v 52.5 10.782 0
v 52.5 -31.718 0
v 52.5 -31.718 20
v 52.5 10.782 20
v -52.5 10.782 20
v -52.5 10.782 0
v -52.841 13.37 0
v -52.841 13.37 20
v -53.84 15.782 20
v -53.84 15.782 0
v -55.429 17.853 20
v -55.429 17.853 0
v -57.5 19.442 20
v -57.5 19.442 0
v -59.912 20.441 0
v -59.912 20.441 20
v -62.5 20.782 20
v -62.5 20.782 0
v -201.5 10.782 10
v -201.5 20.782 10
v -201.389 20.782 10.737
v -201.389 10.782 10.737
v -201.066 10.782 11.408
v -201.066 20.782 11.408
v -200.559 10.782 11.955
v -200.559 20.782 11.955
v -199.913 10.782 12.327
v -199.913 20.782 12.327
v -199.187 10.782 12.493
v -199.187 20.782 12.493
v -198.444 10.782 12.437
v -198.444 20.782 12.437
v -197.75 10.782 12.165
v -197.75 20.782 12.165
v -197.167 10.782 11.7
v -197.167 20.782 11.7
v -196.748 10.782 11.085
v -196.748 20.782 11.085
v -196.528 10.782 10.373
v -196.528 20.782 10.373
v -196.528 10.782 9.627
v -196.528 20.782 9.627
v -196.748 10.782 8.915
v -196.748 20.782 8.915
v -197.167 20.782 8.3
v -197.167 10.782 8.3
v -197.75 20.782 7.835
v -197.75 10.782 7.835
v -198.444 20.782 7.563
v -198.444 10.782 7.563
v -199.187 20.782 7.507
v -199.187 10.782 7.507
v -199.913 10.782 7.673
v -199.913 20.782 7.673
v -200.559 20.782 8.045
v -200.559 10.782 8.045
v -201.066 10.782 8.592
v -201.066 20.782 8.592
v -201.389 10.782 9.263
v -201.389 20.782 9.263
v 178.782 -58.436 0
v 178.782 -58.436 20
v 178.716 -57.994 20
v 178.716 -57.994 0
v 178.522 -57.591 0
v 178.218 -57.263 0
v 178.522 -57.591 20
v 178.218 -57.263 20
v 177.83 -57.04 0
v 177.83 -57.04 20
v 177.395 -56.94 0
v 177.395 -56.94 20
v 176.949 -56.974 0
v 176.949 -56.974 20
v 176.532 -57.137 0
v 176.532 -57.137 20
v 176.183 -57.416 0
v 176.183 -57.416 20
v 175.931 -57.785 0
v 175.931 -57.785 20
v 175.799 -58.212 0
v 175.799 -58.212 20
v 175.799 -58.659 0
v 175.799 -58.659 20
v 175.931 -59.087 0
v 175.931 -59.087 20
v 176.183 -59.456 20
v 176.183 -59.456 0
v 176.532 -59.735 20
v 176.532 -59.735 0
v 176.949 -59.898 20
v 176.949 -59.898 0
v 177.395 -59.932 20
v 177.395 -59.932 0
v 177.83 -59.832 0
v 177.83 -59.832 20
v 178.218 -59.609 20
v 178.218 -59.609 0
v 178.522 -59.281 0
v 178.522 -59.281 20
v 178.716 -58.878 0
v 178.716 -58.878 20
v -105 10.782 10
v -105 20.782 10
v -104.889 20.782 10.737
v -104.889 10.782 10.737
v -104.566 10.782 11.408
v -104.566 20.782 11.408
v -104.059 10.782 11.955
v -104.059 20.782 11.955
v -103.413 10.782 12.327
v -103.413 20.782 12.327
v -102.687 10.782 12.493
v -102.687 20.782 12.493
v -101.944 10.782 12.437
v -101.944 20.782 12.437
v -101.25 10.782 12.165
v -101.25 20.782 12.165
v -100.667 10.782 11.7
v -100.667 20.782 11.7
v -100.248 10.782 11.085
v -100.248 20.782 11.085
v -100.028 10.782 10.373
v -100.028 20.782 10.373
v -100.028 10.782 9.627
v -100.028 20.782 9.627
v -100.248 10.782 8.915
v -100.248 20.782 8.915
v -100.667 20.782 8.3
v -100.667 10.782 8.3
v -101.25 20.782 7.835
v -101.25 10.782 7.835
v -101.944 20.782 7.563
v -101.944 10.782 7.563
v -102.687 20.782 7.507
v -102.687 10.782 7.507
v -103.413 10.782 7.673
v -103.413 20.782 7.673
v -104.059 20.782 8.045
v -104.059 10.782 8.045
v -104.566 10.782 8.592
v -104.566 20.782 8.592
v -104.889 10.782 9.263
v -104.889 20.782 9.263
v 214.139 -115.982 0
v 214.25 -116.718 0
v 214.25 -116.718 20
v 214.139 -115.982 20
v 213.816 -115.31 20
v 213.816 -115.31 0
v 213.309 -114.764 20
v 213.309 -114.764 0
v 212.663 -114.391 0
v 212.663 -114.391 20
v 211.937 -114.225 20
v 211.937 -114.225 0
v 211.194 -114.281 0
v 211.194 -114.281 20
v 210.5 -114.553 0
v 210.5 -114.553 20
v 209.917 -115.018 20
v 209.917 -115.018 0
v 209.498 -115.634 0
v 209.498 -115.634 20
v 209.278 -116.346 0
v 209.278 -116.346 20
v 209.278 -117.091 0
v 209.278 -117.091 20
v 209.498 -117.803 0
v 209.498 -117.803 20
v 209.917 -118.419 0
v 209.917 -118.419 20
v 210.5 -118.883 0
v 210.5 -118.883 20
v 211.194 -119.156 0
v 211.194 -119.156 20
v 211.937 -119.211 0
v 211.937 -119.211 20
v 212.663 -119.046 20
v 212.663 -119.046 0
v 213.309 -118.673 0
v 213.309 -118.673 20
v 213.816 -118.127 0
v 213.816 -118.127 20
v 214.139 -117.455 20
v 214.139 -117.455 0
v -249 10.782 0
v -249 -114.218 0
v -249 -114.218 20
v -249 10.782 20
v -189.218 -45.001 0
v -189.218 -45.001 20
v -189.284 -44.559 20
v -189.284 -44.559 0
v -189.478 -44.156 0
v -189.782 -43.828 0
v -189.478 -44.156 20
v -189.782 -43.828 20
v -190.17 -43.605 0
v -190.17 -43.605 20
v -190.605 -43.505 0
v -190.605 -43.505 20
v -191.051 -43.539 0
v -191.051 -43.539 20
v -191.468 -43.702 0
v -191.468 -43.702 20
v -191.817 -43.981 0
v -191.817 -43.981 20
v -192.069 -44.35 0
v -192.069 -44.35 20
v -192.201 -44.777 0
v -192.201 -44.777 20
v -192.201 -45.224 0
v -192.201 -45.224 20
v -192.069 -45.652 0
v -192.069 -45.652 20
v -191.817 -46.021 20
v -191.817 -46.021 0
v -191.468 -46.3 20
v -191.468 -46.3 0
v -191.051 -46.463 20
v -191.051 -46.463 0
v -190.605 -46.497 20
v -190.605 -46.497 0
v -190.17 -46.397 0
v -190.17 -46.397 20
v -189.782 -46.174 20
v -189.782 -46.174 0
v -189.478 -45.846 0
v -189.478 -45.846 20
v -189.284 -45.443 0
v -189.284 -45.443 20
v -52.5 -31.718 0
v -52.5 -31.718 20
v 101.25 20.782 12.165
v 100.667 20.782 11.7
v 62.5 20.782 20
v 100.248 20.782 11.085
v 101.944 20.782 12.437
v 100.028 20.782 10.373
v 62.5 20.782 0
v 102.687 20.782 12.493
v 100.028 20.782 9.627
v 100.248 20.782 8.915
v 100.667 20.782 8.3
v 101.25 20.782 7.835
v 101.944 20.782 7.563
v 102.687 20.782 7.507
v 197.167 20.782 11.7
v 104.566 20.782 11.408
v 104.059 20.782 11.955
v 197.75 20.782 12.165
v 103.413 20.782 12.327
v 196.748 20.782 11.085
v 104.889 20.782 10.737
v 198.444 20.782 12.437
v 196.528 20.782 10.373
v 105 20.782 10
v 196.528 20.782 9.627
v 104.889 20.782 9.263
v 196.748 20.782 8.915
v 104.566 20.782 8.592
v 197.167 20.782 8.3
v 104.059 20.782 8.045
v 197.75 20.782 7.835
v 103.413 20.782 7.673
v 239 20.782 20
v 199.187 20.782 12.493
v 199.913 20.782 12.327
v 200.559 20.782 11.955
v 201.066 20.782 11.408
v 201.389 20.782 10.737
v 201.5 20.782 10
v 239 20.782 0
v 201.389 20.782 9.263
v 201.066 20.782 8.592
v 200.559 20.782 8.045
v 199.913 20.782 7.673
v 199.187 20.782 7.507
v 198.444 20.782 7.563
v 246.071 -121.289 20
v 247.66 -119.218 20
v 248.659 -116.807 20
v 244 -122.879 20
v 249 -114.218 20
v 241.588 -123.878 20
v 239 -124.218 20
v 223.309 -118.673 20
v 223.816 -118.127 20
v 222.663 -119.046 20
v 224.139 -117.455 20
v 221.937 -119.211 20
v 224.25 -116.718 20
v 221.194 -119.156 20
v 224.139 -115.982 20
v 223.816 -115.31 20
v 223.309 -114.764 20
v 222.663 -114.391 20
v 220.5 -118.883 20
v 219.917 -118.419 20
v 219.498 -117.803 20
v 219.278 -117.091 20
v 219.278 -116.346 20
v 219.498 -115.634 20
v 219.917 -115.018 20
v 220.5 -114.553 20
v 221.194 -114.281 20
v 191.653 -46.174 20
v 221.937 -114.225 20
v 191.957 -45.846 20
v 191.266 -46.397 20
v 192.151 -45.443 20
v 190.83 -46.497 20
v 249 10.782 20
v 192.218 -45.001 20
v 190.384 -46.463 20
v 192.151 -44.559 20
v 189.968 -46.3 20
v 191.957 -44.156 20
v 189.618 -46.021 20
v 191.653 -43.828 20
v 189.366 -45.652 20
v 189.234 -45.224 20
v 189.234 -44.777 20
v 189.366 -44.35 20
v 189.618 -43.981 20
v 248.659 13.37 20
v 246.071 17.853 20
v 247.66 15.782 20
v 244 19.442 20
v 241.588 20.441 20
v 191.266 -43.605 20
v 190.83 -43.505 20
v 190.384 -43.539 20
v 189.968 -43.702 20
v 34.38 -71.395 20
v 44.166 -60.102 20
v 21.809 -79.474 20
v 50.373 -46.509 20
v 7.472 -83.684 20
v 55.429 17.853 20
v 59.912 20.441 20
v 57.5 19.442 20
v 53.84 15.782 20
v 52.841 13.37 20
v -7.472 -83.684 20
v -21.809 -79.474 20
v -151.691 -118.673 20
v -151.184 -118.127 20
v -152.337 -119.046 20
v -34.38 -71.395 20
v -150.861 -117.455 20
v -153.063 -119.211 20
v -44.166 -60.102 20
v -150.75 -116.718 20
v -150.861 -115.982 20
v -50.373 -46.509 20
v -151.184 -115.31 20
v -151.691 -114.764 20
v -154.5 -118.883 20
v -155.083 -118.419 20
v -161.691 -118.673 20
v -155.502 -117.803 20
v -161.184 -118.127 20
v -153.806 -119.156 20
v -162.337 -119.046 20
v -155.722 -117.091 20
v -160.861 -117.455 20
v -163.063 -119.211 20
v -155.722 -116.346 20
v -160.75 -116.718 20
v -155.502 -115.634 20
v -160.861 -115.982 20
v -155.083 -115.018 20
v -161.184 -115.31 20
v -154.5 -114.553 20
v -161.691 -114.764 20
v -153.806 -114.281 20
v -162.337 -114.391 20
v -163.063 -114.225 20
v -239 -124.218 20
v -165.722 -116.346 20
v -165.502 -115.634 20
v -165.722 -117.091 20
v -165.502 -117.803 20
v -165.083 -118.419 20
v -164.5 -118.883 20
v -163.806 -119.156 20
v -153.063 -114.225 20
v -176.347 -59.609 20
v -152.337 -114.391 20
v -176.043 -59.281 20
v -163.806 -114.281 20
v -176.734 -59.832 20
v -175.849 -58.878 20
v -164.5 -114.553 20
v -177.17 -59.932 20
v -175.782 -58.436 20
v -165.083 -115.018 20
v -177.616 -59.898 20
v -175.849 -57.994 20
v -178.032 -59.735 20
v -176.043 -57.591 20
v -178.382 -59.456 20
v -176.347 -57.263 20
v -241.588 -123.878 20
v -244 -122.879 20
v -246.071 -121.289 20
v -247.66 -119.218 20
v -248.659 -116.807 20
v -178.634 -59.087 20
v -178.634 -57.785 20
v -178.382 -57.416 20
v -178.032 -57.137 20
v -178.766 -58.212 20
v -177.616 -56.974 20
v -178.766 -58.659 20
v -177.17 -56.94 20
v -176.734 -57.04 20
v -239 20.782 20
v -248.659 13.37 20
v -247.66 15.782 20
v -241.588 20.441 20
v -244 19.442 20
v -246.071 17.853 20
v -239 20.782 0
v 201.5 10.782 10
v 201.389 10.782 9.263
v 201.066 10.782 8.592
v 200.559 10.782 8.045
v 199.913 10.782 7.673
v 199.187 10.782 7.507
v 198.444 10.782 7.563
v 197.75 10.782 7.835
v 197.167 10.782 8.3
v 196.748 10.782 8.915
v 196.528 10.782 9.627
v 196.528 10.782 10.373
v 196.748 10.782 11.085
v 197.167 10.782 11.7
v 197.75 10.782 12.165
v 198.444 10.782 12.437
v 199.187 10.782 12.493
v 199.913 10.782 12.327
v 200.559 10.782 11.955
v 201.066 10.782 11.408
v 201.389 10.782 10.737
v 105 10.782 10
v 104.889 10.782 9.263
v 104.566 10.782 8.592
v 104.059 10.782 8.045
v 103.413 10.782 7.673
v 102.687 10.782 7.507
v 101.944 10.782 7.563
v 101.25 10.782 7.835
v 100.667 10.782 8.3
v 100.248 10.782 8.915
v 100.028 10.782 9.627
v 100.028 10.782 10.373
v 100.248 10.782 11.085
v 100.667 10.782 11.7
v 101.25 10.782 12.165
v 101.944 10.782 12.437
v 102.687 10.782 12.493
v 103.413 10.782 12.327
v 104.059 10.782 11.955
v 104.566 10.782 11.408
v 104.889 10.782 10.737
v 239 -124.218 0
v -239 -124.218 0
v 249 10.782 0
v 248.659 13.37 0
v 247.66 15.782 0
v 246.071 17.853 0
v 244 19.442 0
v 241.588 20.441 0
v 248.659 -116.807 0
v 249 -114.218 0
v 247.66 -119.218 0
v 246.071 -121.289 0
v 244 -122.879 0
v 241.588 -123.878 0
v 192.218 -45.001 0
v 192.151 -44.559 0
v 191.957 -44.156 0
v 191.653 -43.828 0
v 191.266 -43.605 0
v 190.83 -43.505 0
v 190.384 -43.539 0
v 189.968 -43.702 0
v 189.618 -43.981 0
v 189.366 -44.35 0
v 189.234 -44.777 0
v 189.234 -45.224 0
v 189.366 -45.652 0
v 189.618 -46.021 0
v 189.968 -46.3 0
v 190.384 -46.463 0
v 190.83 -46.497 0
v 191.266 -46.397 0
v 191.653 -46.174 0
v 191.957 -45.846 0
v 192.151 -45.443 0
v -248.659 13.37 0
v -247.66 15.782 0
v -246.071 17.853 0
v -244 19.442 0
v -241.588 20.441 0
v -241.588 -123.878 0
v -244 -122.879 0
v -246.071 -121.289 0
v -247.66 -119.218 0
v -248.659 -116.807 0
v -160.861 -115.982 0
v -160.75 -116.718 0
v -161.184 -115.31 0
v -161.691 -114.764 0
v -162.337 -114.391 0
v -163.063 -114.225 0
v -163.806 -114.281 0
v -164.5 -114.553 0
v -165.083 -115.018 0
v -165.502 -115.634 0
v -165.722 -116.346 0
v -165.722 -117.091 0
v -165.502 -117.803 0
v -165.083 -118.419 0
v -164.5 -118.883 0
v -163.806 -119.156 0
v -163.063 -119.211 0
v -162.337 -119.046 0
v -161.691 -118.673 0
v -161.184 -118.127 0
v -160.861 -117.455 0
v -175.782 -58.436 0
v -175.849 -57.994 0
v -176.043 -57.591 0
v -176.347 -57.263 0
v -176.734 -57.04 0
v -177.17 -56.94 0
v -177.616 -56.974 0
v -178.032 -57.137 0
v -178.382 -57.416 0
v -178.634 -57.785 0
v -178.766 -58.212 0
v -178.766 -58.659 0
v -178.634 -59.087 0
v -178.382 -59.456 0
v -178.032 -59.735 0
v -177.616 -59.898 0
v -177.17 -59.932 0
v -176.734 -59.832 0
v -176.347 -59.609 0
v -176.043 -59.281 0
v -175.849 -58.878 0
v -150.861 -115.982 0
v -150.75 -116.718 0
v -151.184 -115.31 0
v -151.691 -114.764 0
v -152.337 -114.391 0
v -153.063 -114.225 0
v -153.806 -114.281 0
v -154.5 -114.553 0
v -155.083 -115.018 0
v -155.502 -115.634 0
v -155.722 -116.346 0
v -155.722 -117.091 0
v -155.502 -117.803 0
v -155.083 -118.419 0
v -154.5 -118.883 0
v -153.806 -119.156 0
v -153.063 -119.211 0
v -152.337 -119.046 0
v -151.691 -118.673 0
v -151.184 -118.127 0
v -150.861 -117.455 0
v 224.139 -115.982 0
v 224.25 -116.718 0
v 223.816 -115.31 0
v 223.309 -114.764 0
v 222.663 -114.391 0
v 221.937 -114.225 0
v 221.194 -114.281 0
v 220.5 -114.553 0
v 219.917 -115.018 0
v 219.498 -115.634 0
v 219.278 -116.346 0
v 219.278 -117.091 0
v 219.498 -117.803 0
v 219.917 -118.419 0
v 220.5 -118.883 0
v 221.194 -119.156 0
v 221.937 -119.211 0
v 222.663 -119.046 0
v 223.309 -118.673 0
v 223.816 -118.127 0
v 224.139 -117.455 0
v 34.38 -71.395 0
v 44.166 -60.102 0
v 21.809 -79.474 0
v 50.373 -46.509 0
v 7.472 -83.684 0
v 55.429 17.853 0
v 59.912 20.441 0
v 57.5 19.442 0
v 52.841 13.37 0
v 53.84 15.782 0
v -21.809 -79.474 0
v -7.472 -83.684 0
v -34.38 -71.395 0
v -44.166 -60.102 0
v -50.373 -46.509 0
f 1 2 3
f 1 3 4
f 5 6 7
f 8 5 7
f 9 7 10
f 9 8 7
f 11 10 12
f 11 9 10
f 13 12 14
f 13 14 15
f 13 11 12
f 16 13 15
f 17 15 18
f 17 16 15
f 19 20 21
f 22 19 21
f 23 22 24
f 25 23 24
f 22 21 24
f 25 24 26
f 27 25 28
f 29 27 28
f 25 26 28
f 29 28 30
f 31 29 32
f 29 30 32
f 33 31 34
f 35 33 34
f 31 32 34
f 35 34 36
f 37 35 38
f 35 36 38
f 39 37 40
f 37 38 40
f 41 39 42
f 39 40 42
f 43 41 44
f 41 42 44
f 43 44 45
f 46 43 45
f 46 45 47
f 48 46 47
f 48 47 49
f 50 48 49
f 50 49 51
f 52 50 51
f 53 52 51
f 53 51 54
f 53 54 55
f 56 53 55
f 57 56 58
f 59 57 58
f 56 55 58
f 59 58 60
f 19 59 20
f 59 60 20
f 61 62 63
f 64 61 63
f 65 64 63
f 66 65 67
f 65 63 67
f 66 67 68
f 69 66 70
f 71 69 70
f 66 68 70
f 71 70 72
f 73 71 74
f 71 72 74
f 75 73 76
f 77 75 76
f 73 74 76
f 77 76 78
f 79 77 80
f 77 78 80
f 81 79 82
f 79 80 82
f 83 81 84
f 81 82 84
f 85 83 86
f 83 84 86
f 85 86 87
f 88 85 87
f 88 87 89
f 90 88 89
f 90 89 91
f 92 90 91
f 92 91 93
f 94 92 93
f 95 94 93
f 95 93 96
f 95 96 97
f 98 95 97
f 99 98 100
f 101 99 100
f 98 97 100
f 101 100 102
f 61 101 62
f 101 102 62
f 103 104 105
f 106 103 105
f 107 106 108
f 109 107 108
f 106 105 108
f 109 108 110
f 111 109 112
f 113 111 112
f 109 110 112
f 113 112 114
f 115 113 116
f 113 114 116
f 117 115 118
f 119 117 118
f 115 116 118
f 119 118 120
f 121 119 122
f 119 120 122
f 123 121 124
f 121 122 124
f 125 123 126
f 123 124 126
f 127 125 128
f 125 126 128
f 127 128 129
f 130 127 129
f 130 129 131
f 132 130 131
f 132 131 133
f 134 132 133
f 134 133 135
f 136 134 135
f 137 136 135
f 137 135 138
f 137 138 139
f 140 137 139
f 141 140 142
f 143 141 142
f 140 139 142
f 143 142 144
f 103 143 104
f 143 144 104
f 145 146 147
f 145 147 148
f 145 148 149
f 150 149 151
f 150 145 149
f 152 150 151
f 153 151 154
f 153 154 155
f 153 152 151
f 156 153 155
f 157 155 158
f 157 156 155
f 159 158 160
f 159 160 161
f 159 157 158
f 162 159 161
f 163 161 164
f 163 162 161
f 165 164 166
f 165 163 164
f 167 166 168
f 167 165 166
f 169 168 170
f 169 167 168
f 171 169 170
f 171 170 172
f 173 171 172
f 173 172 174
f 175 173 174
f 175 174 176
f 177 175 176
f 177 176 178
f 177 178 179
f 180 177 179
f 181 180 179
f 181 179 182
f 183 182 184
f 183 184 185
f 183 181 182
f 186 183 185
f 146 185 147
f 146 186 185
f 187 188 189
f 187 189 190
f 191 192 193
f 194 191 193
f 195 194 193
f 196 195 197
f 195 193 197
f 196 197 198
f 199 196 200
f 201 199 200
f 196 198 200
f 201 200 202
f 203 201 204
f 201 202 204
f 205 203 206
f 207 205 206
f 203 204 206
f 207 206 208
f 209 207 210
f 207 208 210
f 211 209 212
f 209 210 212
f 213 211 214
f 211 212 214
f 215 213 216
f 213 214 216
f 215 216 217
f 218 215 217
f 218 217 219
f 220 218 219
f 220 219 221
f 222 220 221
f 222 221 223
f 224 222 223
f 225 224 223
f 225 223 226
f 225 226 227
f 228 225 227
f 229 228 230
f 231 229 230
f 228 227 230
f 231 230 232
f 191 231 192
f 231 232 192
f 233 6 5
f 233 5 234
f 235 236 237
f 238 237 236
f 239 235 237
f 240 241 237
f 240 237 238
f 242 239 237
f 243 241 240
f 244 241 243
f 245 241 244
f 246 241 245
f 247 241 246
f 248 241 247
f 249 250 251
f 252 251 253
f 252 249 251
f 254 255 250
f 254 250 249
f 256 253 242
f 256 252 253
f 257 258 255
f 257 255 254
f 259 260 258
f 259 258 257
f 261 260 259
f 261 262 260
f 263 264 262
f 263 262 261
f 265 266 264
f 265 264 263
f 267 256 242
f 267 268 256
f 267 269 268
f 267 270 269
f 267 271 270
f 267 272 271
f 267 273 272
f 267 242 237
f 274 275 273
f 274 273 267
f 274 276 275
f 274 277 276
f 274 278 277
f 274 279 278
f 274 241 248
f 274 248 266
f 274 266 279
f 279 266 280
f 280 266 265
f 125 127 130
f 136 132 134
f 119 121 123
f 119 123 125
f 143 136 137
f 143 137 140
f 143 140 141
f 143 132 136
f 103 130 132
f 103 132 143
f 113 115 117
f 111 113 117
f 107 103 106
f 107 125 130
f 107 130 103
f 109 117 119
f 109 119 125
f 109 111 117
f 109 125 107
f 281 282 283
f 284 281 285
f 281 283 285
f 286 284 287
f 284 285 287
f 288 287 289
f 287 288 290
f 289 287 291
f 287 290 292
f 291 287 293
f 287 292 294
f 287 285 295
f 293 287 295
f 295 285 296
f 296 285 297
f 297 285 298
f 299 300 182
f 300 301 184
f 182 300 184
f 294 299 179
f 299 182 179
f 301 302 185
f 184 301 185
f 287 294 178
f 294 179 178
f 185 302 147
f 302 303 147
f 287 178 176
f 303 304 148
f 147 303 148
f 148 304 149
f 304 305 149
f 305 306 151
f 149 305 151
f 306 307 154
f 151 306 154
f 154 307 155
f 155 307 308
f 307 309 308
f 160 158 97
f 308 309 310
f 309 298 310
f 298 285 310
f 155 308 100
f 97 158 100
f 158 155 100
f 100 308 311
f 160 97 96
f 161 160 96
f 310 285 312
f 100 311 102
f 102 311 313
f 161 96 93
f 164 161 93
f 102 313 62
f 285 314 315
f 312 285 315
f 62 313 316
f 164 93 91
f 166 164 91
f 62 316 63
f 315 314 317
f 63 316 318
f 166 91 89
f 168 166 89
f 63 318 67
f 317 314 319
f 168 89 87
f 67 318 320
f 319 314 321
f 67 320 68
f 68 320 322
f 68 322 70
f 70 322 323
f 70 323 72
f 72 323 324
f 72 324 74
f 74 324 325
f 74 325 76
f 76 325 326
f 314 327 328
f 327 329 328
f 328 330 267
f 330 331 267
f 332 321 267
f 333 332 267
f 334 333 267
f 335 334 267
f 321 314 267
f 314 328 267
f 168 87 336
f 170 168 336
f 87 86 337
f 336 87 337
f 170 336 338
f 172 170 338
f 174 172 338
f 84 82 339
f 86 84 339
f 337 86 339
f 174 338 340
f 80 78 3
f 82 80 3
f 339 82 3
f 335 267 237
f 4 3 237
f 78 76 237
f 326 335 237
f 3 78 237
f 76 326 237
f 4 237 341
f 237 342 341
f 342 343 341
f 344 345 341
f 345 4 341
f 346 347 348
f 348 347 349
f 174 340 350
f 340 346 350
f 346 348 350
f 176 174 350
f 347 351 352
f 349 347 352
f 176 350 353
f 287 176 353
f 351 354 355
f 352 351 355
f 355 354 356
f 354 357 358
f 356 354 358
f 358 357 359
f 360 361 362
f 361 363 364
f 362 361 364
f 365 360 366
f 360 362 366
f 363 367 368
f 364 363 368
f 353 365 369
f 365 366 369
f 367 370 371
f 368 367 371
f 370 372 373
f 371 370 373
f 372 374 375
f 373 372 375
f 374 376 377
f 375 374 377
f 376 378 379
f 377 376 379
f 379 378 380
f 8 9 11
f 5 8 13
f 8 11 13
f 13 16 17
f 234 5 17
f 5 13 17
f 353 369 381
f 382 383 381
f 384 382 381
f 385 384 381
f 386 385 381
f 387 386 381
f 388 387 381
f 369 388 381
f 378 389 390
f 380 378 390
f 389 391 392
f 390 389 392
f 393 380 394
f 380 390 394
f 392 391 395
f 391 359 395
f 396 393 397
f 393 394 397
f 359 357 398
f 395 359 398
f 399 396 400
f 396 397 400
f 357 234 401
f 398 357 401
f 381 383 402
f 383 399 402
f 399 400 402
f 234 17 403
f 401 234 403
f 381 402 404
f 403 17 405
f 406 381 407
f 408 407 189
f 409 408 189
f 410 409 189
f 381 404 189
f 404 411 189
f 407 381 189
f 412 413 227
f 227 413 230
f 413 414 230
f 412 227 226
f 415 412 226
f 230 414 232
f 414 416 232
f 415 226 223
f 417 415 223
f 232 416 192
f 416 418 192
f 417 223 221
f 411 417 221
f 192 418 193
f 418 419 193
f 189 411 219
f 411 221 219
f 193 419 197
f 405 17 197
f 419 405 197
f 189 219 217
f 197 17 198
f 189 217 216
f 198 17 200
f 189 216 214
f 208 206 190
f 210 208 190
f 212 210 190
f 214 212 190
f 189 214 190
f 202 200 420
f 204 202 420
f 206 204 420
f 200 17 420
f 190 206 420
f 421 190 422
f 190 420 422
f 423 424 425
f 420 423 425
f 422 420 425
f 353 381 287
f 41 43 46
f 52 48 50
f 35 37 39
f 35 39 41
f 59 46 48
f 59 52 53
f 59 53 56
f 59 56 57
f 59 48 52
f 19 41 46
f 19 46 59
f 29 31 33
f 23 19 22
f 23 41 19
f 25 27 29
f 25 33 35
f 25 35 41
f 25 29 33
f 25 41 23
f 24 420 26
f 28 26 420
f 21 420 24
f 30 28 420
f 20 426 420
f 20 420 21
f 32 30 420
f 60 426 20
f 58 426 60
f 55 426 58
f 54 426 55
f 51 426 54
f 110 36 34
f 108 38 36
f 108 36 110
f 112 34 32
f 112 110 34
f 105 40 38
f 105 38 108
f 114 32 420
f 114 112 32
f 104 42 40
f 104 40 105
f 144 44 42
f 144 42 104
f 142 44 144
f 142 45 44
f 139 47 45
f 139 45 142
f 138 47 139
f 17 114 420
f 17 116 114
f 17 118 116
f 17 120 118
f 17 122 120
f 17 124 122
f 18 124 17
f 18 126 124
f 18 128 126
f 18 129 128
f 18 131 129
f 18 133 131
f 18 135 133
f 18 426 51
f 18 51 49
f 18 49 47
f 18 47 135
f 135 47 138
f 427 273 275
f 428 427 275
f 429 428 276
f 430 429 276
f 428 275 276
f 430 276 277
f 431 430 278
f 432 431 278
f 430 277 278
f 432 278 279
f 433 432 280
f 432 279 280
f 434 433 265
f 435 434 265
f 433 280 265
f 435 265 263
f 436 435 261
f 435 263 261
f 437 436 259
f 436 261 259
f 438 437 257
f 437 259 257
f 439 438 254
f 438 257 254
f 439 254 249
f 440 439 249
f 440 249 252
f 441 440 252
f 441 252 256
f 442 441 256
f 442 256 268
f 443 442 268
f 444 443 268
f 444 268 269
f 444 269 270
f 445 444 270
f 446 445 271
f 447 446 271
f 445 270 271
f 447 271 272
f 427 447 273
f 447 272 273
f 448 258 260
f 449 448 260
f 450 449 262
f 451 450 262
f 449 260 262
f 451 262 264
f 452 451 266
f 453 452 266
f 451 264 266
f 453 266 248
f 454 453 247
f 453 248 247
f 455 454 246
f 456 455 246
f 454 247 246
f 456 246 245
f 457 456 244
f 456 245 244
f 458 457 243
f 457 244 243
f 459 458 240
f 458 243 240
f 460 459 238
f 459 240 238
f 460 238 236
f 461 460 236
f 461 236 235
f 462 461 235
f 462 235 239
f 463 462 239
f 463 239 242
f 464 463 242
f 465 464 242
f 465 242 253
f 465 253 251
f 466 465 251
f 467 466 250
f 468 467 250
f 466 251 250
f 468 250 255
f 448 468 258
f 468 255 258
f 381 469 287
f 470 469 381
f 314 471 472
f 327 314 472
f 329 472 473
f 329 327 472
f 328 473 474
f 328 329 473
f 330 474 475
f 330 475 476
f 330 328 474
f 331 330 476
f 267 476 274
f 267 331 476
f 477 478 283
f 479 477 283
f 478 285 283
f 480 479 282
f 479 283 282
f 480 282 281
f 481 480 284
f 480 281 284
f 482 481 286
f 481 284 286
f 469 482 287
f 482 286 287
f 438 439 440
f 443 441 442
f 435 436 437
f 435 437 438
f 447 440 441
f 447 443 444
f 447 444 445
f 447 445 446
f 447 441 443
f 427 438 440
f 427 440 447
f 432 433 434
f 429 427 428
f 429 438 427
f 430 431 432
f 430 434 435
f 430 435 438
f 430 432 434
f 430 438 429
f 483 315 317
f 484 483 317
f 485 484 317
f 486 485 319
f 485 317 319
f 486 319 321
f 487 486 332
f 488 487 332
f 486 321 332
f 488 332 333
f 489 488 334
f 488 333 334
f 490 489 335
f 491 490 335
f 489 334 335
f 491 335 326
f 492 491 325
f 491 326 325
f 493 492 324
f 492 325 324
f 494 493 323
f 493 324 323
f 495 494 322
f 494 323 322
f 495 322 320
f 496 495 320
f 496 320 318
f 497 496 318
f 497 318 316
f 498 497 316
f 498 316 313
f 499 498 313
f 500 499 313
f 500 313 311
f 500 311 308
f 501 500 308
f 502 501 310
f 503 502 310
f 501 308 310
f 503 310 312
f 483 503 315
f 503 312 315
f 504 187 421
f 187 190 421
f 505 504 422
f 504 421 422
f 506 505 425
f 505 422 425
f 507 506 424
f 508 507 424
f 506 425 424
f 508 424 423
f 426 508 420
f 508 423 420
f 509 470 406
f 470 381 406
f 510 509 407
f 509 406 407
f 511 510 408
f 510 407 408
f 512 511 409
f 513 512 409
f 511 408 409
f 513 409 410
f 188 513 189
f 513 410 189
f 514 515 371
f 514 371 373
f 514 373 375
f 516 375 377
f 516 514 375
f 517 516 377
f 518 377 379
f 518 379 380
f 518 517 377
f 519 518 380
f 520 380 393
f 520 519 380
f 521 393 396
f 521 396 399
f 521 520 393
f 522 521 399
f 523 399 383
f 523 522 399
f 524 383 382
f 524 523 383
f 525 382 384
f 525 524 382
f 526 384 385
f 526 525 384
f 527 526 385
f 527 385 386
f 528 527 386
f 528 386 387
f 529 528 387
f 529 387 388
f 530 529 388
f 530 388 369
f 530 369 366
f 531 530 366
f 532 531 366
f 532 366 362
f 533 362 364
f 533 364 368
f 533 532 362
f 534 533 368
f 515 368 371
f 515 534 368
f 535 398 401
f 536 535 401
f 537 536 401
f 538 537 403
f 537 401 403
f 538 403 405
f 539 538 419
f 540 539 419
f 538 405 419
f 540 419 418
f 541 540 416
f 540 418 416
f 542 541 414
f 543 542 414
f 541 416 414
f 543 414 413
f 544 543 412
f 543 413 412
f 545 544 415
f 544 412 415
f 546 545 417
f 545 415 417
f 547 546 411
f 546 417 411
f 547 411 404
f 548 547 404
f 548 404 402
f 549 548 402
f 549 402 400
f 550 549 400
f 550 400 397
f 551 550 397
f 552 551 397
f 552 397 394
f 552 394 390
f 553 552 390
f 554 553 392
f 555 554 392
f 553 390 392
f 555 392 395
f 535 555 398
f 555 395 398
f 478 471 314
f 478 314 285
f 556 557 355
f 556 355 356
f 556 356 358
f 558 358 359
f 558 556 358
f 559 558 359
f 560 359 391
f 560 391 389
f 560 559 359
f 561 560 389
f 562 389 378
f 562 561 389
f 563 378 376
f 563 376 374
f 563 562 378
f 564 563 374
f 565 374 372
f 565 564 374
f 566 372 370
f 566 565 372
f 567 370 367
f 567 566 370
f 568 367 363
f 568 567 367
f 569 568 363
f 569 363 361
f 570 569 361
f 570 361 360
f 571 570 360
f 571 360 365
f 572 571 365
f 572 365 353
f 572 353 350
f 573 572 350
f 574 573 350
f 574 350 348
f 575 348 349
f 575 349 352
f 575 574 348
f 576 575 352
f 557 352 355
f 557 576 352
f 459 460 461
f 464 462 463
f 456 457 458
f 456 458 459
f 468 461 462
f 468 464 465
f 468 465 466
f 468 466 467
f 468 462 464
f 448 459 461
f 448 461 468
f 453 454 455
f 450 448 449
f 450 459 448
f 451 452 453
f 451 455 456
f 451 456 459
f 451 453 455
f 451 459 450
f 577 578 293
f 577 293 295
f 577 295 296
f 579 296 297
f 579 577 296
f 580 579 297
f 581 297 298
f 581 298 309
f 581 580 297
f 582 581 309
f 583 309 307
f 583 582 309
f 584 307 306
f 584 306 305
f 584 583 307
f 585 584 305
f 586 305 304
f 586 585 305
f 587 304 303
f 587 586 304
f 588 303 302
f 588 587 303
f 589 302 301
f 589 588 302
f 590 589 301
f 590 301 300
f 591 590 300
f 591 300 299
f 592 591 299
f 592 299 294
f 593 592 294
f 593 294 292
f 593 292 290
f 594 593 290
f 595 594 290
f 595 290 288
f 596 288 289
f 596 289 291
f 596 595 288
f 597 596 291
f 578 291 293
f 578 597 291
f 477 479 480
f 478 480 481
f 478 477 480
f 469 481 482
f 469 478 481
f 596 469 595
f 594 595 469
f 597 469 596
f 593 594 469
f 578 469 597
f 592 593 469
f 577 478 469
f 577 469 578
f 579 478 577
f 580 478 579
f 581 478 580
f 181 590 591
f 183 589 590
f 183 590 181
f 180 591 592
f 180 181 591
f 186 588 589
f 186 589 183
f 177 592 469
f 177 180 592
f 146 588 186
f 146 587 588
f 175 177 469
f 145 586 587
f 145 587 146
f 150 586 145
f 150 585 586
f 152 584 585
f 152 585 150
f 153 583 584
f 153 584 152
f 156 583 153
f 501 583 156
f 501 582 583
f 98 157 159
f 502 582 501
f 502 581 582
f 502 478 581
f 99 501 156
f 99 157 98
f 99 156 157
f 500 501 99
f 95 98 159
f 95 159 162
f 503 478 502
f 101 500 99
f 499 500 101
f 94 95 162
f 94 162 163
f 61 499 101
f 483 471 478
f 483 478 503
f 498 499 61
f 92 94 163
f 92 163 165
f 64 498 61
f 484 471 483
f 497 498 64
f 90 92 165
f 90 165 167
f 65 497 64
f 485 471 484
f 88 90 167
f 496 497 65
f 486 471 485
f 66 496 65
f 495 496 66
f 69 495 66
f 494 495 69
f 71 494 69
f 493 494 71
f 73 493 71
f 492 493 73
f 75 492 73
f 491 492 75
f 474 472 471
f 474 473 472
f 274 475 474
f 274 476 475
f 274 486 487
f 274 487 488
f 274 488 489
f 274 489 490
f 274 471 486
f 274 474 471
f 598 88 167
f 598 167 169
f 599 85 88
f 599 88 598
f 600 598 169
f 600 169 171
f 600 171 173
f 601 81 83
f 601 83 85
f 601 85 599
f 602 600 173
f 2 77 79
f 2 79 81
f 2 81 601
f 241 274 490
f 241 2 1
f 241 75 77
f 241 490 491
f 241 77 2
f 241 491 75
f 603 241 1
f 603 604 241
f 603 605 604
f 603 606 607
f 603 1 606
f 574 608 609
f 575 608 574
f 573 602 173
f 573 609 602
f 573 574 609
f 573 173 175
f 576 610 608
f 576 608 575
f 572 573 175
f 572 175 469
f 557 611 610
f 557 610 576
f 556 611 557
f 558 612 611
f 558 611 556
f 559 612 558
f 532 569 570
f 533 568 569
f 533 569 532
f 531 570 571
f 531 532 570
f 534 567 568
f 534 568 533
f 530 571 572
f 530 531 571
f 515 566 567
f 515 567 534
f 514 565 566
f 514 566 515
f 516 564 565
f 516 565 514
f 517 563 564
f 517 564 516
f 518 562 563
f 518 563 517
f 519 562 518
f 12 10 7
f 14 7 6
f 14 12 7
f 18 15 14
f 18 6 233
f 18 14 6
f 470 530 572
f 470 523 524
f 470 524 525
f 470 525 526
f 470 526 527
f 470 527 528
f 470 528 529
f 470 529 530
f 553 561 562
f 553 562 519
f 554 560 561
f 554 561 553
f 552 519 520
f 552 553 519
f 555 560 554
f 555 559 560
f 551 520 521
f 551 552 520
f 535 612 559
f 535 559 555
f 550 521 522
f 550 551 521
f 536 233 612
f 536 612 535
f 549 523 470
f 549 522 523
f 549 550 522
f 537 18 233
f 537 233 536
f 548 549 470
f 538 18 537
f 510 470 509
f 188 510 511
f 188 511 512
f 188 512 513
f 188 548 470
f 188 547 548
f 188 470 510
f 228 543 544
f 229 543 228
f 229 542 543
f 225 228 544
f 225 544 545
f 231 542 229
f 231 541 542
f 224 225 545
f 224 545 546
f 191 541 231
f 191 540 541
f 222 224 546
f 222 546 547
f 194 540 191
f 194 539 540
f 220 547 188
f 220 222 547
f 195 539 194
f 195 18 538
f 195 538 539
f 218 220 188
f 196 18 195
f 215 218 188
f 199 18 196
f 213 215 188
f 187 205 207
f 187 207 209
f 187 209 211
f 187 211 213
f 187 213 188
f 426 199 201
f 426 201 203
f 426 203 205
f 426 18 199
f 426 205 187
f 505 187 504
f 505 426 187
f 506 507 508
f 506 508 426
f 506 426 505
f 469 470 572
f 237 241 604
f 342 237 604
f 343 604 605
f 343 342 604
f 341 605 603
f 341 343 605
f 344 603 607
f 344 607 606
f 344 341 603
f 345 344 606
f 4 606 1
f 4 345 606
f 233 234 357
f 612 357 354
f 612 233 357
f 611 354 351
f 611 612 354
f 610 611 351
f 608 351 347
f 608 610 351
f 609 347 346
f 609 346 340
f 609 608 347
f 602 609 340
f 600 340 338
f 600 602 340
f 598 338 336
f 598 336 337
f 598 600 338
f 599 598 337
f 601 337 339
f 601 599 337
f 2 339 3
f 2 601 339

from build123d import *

# Parameters (mm, degrees)
SKETCH1_R           = 2.5
BOSS_EXTRUDE1_DEPTH = 20
FILLET1_R           = 10
SKETCH2_R           = 1.5
CUT_EXTRUDE1_DEPTH  = 20
SKETCH3_R           = 2.5
CUT_EXTRUDE2_DEPTH  = 10
FILLET2_R           = 10


with BuildPart() as part:
    # Sketch1 → Boss-Extrude1 (new body)
    with BuildSketch(Plane.XY):
        with BuildLine():
            Line((52.5, 20.781588347), (249, 20.781588347))
            Line((249, 20.781588347), (249, -124.218411653))
            Line((249, -124.218411653), (-249, -124.218411653))
            Line((-249, -124.218411653), (-249, 20.781588347))
            Line((-249, 20.781588347), (-52.5, 20.781588347))
            Line((-52.5, 20.781588347), (-52.5, -31.718411653))
            ThreePointArc((-52.5, -31.718411653), (0, -84.218411653), (52.5, -31.718411653))
            Line((52.5, -31.718411653), (52.5, 20.781588347))
        make_face()
        with Locations((-163.25, -116.718411653)):
            Circle(SKETCH1_R, mode=Mode.SUBTRACT)
        with Locations((-153.25, -116.718411653)):
            Circle(SKETCH1_R, mode=Mode.SUBTRACT)
        with Locations((211.75, -116.718411653)):
            Circle(SKETCH1_R, mode=Mode.SUBTRACT)
        with Locations((221.75, -116.718411653)):
            Circle(SKETCH1_R, mode=Mode.SUBTRACT)
    extrude(amount=BOSS_EXTRUDE1_DEPTH)

    # Fillet1
    fillet1_edges = [part.edges().sort_by_distance(p)[0] for p in [
        (249, -124.218411653, 10),
        (-249, -124.218411653, 10),
    ]]
    fillet(fillet1_edges, radius=FILLET1_R)

    # Sketch2 → Cut-Extrude1 (cut)
    with BuildSketch(Plane.XY.offset(20)):
        with Locations((-177.282485579, -58.435926074)):
            Circle(SKETCH2_R)
        with Locations((-190.717514421, -45.000897232)):
            Circle(SKETCH2_R)
        with Locations((190.717514421, -45.000897232)):
            Circle(SKETCH2_R)
        with Locations((177.282485579, -58.435926074)):
            Circle(SKETCH2_R)
    extrude(amount=-CUT_EXTRUDE1_DEPTH, mode=Mode.SUBTRACT)

    # Sketch3 → Cut-Extrude2 (cut)
    with BuildSketch(Plane(origin=(0, 20.781588347, 0), x_dir=(1, 0, 0), z_dir=(0, 1, 0))):
        with Locations(Location((-199, -10, 0), (0, 0, 180))):
            Circle(SKETCH3_R)
        with Locations(Location((-102.5, -10, 0), (0, 0, 180))):
            Circle(SKETCH3_R)
        with Locations((102.5, -10)):
            Circle(SKETCH3_R)
        with Locations((199, -10)):
            Circle(SKETCH3_R)
    extrude(amount=-CUT_EXTRUDE2_DEPTH, mode=Mode.SUBTRACT)

    # Fillet2
    fillet2_edges = [part.edges().sort_by_distance(p)[0] for p in [
        (-249, 20.781588347, 10),
        (-52.5, 20.781588347, 10),
        (52.5, 20.781588347, 10),
        (249, 20.781588347, 10),
    ]]
    fillet(fillet2_edges, radius=FILLET2_R)


solid = part.part
